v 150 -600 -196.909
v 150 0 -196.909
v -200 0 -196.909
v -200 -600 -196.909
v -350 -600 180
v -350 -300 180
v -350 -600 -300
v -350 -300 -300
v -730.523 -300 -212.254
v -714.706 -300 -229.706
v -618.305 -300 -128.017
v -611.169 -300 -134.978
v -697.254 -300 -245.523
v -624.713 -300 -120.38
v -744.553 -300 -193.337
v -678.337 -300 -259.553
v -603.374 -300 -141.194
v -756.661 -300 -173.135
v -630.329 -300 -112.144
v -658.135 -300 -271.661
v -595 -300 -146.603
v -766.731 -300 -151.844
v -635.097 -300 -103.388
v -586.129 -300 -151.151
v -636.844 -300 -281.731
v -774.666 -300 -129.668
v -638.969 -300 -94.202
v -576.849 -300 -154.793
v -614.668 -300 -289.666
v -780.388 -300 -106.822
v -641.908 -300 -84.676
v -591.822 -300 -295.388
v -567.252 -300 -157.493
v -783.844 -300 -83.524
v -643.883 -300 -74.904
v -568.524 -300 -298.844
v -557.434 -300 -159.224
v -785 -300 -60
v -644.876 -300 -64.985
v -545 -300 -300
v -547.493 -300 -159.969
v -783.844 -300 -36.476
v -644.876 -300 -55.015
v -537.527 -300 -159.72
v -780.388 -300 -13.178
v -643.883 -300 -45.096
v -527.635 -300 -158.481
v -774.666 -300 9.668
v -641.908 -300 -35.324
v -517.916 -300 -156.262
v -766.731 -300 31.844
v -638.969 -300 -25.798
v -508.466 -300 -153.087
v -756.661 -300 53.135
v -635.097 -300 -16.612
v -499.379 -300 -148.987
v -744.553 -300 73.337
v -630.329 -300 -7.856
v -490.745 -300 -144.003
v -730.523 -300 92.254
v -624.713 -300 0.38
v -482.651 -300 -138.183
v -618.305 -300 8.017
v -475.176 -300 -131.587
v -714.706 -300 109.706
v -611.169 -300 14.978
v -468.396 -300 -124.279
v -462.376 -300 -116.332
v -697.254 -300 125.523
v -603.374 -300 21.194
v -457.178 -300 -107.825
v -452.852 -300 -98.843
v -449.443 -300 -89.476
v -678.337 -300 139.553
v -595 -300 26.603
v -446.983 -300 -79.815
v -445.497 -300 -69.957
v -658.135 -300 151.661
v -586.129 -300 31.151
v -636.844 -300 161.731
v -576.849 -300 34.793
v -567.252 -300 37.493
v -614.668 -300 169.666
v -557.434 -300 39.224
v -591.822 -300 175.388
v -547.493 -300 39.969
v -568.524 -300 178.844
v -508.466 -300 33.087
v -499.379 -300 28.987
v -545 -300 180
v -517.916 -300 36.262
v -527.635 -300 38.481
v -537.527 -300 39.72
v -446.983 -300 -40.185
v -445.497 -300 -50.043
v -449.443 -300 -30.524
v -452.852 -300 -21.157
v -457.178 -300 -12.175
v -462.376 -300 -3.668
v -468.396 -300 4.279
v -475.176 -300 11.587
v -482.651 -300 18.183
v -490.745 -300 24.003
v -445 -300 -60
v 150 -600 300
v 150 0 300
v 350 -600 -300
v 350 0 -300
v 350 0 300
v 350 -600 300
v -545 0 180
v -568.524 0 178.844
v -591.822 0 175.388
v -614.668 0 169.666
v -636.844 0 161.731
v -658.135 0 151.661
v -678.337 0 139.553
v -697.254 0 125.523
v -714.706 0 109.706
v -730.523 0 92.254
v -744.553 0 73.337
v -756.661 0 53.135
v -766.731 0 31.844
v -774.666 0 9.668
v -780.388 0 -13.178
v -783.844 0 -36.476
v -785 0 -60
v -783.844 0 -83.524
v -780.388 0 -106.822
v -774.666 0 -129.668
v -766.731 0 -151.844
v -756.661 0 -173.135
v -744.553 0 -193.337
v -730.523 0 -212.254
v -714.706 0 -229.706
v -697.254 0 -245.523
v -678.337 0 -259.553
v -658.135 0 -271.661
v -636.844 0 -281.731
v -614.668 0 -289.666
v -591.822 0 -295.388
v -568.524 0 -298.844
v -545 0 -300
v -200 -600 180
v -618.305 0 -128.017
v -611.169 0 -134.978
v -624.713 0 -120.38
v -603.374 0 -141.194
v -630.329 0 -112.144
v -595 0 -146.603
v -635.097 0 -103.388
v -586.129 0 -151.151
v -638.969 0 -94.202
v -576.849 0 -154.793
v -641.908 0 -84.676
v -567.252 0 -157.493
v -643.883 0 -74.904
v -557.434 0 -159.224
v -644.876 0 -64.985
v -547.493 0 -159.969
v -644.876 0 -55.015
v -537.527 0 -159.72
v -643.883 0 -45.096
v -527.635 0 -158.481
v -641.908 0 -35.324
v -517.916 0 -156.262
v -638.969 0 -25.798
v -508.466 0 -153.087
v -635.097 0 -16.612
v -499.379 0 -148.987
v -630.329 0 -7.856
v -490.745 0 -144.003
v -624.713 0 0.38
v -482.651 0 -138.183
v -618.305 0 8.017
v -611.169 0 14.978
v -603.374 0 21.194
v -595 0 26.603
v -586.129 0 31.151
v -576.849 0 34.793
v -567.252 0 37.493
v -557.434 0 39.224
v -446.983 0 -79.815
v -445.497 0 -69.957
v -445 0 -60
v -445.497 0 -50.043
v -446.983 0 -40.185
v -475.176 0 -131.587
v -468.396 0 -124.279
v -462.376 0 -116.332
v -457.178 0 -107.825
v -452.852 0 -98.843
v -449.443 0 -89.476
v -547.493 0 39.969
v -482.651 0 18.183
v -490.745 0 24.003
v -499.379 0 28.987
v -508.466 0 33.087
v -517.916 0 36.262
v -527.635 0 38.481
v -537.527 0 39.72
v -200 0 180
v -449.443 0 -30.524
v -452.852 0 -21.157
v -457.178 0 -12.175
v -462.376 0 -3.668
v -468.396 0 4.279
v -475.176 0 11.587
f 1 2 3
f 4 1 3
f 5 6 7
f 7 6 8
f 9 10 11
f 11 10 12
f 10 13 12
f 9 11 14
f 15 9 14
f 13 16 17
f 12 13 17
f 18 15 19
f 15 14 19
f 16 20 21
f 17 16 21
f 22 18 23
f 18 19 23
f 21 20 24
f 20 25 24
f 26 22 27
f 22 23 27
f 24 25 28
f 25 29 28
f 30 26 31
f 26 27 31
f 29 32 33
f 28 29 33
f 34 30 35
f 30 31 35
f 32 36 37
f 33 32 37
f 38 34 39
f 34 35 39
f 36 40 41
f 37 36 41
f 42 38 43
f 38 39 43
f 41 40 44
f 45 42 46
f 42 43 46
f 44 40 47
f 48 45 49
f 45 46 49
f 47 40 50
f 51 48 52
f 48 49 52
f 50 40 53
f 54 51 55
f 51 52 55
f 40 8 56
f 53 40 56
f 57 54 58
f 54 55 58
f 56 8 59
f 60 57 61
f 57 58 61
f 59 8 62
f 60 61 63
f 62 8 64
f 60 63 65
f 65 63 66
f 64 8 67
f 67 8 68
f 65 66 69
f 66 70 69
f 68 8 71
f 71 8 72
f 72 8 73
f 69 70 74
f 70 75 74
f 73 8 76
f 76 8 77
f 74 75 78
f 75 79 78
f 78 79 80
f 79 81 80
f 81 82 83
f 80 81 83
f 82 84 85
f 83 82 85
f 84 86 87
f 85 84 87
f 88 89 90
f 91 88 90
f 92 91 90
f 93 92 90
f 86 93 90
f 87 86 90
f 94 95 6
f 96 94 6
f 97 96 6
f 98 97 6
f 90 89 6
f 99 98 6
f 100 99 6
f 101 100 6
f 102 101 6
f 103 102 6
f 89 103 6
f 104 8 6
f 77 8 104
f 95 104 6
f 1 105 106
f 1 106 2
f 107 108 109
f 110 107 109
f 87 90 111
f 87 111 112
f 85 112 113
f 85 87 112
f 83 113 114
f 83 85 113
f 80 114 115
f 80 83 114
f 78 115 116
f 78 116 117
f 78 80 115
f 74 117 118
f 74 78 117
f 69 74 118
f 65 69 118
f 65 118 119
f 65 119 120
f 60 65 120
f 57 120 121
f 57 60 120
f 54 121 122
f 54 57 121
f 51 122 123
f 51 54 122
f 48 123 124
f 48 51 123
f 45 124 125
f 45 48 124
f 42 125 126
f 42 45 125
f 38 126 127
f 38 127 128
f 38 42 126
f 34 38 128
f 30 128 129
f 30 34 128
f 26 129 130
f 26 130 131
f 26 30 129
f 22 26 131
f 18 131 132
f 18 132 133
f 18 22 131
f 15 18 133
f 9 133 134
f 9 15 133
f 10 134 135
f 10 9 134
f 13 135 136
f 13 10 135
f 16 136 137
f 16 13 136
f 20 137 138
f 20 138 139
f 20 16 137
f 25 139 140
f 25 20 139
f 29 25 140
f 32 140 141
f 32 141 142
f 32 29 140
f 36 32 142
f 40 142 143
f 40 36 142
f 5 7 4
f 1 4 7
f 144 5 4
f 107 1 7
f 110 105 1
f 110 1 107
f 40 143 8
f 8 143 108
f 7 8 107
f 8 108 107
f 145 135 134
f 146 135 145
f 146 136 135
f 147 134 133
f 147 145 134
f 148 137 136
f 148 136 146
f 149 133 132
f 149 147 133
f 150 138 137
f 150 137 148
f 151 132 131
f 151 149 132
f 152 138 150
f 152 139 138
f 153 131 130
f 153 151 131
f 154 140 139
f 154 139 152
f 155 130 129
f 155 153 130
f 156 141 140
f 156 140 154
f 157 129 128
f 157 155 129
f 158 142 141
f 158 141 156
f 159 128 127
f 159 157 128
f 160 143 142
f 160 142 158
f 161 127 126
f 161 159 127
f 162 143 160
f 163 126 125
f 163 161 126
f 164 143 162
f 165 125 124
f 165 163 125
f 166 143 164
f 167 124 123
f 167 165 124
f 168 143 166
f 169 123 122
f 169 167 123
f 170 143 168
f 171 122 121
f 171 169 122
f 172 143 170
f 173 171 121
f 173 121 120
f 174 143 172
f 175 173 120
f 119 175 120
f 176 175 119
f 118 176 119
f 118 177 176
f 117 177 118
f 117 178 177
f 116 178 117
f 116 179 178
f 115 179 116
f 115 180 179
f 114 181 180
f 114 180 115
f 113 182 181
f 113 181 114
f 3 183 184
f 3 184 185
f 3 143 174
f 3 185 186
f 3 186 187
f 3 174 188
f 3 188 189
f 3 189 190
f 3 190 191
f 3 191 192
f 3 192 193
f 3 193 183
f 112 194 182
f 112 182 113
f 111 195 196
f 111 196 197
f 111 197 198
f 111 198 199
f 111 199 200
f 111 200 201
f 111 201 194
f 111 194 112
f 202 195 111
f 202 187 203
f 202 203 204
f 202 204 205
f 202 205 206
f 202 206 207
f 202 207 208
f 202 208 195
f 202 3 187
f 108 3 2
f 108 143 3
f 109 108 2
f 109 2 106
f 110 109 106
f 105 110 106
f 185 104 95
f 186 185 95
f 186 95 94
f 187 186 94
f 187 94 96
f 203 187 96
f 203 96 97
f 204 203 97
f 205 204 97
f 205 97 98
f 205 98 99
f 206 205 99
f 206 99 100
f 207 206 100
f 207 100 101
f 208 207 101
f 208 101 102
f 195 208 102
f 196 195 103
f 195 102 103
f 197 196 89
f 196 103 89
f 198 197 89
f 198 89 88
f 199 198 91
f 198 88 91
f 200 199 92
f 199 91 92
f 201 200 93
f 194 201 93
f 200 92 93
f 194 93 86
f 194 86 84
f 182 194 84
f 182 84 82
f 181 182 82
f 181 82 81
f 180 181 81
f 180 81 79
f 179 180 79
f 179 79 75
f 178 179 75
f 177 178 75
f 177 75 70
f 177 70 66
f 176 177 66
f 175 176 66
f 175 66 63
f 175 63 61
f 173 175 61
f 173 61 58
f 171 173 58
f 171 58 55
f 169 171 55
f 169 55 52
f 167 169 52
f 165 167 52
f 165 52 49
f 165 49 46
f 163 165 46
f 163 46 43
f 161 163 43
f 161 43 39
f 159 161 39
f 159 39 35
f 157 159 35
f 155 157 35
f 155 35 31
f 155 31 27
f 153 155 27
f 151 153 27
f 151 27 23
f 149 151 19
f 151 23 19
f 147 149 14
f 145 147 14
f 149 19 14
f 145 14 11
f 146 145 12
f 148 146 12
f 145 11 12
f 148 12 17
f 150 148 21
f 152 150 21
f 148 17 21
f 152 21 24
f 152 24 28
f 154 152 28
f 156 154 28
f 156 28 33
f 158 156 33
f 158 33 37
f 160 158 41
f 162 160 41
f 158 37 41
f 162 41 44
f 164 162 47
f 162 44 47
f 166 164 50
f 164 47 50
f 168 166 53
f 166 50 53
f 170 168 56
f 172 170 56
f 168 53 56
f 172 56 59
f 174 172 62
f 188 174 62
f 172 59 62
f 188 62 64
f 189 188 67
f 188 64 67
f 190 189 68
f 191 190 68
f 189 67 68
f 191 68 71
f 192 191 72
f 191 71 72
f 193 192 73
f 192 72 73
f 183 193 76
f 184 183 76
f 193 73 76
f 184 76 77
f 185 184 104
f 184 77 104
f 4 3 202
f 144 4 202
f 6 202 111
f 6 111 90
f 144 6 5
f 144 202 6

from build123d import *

# Parameters (mm, degrees)
F1_DEPTH = 600
F2_W     = 300
F2_H     = 480
F3_DEPTH = 195
F5_DEPTH = 300
F6_R     = 100
F7_DEPTH = 300.001


with BuildPart() as f1:
    # F0 (on Front) → F1 (new body)
    with BuildSketch(Plane.XZ):
        Polygon((-350, 180), (-350, -300), (350, -300), (350, 300), (150, 300), (150, -196.909353), (-200, -196.909353), (-200, 180), align=None)
    extrude(amount=F1_DEPTH)

    # F2 (on face) → F3 (join)
    with BuildSketch(Plane(origin=(-350, 0, 0), x_dir=(0, -1, 0), z_dir=(-1, 0, 0))):
        with Locations((150, -60)):
            Rectangle(F2_W, F2_H)
    extrude(amount=F3_DEPTH)

    # F4 (on face) → F5 (join)
    with BuildSketch(Plane.XZ.offset(300)):
        with BuildLine():
            ThreePointArc((-545, -300), (-375.294373, -229.705627), (-305, -60))
            ThreePointArc((-305, -60), (-375.294373, 109.705627), (-545, 180))
            Line((-545, 180), (-545, -300))
        make_face()
        with BuildLine():
            Line((-545, -300), (-545, 180))
            ThreePointArc((-545, 180), (-785, -60), (-545, -300))
        make_face()
    extrude(amount=-F5_DEPTH)

    # F6 (on face) → F7 (cut, through all)
    with BuildSketch(Plane.XZ.offset(300)):
        with Locations((-545, -60)):
            Circle(F6_R)
    extrude(amount=-F7_DEPTH, mode=Mode.SUBTRACT)


solid = f1.part
